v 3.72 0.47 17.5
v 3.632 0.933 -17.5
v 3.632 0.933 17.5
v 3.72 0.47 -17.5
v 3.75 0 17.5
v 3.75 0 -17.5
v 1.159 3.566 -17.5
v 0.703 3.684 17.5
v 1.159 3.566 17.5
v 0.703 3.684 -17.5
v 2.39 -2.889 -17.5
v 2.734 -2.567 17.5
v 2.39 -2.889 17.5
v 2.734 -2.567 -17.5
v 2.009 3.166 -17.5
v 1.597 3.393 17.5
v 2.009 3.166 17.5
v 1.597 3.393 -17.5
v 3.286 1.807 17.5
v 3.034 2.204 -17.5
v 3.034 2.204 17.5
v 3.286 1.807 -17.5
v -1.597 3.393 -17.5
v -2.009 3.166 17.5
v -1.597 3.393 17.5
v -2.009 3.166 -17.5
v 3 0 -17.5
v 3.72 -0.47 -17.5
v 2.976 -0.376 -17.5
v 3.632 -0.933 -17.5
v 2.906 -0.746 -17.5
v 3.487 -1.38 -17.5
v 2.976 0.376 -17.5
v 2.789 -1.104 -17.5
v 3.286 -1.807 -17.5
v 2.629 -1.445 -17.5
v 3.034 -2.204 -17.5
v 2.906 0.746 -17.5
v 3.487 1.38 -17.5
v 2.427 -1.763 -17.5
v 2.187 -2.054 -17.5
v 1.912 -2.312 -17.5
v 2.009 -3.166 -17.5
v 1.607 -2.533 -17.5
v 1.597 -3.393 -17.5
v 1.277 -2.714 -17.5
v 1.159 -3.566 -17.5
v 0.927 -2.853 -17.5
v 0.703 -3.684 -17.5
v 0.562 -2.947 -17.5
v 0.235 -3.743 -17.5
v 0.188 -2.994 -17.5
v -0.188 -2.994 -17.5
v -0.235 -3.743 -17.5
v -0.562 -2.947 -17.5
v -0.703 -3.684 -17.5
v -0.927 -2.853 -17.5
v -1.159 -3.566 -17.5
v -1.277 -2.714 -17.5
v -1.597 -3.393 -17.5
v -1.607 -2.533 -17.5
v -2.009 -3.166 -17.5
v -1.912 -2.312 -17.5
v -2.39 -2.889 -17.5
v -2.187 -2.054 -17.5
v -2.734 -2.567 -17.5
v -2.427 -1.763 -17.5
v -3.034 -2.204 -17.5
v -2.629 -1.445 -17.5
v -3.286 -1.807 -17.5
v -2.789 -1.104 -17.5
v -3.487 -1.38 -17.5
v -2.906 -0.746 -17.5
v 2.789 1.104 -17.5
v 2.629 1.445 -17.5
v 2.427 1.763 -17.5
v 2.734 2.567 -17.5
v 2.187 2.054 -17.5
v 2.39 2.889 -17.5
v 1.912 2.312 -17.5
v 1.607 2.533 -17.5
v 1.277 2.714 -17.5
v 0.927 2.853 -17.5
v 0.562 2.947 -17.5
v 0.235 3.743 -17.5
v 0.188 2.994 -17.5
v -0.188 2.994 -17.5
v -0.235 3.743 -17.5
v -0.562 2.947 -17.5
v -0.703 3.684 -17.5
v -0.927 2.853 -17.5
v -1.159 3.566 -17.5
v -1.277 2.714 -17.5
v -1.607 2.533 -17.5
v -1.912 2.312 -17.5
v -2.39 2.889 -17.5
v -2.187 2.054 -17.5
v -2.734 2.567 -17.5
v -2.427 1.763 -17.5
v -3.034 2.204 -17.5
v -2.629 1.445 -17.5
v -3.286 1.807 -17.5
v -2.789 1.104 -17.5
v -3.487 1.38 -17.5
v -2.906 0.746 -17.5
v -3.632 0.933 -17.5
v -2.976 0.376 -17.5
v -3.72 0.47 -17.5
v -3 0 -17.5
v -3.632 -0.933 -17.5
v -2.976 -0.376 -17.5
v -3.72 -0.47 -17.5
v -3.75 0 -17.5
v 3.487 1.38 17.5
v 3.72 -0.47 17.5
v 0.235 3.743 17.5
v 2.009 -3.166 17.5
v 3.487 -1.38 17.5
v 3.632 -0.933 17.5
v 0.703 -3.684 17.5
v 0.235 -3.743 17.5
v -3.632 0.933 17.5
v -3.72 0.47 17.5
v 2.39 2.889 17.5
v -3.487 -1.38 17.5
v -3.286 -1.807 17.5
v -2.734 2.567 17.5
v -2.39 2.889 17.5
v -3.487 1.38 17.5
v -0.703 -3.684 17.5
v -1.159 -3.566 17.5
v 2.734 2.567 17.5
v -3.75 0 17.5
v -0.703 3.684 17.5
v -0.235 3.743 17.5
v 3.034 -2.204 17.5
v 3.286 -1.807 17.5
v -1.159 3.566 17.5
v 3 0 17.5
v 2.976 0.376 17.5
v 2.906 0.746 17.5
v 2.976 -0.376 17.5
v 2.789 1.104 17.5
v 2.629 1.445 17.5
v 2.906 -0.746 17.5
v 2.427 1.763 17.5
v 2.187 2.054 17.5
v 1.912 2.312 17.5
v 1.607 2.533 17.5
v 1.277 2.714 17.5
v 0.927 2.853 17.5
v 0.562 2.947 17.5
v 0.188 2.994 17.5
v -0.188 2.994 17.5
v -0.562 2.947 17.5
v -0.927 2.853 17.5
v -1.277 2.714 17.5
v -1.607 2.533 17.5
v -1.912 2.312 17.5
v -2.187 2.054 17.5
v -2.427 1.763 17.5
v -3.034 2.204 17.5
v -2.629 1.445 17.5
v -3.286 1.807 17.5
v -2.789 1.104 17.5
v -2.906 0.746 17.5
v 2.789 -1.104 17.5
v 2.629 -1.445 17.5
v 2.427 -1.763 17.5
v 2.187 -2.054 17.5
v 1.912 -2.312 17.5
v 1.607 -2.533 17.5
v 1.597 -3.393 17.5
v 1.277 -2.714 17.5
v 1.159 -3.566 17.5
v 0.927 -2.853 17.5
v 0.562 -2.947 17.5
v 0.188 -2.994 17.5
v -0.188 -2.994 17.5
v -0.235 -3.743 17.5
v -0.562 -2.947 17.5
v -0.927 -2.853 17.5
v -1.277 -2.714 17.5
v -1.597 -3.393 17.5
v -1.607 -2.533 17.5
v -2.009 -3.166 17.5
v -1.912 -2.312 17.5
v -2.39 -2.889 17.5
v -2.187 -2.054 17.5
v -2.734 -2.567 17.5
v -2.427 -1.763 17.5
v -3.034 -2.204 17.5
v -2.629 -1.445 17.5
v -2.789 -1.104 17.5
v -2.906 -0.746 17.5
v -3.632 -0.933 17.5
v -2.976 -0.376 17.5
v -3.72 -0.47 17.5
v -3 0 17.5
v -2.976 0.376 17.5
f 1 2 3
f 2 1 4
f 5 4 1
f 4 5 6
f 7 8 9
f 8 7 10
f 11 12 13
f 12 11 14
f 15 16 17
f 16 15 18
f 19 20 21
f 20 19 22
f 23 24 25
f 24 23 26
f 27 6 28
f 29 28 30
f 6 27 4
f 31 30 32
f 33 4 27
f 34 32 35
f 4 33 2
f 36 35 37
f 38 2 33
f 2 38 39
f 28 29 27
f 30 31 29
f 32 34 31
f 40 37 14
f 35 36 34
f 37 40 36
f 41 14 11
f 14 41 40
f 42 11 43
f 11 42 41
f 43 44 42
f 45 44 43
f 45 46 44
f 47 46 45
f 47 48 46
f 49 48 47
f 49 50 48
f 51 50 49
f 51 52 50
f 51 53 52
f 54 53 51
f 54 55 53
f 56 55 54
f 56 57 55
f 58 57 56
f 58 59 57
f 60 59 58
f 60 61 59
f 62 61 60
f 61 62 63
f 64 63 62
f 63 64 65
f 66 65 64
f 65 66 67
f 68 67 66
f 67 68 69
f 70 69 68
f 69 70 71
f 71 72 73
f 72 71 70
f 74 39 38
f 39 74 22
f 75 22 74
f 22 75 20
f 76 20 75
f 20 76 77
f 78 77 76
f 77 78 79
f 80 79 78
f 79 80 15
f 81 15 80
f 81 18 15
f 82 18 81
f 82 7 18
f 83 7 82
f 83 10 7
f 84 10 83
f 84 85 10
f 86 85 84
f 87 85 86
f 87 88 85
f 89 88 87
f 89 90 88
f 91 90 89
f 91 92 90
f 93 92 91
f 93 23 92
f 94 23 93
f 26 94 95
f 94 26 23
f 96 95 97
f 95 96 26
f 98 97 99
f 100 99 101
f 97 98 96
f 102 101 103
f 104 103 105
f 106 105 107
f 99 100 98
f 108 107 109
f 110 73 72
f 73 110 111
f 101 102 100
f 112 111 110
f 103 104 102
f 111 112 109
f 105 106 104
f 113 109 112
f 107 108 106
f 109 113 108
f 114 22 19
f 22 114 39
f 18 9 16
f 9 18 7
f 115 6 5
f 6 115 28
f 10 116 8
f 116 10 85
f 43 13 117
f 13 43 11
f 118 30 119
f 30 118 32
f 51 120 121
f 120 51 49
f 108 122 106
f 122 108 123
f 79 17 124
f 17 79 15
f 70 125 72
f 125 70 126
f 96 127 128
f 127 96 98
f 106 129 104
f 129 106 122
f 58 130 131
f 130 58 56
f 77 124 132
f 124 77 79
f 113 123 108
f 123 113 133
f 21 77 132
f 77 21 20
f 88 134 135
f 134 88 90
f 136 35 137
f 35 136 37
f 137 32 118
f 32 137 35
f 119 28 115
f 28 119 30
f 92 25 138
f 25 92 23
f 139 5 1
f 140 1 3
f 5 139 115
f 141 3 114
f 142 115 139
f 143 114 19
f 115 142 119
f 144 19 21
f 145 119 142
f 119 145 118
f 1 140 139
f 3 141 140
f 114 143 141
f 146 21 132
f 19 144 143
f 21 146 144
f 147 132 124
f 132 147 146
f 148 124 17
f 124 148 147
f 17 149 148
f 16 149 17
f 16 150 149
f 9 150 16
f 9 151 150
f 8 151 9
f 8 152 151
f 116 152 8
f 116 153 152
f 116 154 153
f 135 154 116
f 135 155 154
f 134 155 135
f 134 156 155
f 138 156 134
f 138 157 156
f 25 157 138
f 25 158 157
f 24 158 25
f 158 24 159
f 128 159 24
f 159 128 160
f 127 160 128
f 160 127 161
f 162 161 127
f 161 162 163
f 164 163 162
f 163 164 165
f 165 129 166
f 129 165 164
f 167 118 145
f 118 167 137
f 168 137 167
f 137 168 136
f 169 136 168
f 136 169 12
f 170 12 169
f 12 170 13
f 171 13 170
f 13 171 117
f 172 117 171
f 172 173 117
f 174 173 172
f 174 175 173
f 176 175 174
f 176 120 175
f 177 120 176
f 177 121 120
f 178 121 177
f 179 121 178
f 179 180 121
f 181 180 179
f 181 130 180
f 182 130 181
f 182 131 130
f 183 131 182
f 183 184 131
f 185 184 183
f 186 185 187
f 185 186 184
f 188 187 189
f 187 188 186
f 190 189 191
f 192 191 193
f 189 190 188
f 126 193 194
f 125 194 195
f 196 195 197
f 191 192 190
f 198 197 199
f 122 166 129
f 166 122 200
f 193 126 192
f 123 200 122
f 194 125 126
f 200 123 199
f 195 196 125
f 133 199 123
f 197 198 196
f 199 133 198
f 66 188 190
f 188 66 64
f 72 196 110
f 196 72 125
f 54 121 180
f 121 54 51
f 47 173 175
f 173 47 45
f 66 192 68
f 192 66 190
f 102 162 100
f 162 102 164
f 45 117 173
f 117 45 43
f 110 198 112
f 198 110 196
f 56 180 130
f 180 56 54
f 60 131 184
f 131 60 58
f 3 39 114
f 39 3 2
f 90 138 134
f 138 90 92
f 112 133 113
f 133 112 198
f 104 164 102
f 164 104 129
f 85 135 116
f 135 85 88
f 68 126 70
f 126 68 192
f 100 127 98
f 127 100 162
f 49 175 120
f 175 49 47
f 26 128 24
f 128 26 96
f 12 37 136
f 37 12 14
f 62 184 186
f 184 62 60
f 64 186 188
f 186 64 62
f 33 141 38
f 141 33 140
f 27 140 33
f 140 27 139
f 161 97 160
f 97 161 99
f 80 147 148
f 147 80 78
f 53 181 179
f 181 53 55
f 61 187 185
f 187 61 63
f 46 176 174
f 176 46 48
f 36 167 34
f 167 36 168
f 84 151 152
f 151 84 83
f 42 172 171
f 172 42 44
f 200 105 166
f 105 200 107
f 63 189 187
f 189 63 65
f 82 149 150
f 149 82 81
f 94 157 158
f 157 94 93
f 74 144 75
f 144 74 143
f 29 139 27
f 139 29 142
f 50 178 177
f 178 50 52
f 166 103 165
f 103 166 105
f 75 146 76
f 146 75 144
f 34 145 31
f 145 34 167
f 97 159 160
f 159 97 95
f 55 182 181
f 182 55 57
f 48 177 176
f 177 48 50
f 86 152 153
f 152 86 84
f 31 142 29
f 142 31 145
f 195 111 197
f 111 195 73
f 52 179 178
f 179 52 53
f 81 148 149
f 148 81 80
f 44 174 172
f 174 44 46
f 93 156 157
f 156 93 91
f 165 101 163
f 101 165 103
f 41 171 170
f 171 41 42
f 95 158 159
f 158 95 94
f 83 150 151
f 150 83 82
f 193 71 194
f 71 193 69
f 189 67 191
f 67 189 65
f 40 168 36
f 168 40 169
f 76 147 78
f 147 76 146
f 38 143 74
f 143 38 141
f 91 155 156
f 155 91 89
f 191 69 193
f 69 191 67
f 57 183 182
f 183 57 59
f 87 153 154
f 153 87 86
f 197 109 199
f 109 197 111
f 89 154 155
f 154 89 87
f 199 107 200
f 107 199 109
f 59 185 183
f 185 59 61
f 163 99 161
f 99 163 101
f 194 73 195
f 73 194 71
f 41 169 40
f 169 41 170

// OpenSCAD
$fn = 50;


difference() {
	union() {
		translate(v = [0, 0, -17.5000000000]) {
			cylinder(h = 35, r = 3.7500000000);
		}
	}
	union() {
		translate(v = [0, 0, -100.0000000000]) {
			cylinder(h = 200, r = 3.0000000000);
		}
	}
}
